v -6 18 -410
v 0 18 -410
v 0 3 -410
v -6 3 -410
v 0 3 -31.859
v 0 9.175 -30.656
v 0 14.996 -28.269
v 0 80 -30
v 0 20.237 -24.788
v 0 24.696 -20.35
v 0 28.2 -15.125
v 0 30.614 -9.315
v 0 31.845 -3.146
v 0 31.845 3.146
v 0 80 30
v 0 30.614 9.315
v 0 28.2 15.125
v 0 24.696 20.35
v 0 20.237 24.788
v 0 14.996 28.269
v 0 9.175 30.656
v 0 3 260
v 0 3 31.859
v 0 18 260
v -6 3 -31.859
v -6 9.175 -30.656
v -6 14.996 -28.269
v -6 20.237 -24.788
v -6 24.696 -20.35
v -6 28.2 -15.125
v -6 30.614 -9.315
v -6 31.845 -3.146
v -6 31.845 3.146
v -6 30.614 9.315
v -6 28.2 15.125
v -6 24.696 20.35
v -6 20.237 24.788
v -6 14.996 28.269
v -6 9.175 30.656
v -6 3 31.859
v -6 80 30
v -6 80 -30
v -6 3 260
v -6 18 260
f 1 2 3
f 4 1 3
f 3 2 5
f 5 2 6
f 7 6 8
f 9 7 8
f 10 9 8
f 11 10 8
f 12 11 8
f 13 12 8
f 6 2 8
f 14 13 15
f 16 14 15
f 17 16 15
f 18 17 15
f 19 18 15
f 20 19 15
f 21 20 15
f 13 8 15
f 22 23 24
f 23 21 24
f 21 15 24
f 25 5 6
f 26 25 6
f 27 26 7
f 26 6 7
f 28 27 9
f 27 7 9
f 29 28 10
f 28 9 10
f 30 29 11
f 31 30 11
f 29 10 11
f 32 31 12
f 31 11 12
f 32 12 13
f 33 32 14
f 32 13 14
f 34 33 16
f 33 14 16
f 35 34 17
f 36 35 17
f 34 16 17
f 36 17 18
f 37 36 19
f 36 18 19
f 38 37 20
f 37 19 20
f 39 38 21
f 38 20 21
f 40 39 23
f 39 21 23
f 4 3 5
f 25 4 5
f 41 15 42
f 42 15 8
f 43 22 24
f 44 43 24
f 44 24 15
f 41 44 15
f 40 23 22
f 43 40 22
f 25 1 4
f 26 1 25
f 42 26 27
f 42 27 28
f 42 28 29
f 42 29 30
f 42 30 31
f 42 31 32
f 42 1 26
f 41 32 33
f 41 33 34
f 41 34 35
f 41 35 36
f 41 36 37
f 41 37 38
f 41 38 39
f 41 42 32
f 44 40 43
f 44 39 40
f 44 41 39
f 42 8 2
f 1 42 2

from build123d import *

# Parameters (mm, degrees)
BASE_FLANGE1_DEPTH = 6


# Sheet-metal steps are written as plain solids
with BuildPart() as part:
    # Sketch1 → Base-Flange1 (new body)
    with BuildSketch(Plane(origin=(0, 0, 0), x_dir=(0, 0, -1), z_dir=(1, 0, 0))):
        with BuildLine():
            Line((-31.859064644, 3), (-260, 3))
            Line((-260, 3), (-260, 18))
            Line((-260, 18), (-30, 80))
            Line((-30, 80), (30, 80))
            Line((30, 80), (410, 18))
            Line((410, 18), (410, 3))
            Line((410, 3), (31.859064644, 3))
            ThreePointArc((31.859064644, 3), (0, 32), (-31.859064644, 3))
        make_face()
    extrude(amount=-BASE_FLANGE1_DEPTH)


solid = part.part
